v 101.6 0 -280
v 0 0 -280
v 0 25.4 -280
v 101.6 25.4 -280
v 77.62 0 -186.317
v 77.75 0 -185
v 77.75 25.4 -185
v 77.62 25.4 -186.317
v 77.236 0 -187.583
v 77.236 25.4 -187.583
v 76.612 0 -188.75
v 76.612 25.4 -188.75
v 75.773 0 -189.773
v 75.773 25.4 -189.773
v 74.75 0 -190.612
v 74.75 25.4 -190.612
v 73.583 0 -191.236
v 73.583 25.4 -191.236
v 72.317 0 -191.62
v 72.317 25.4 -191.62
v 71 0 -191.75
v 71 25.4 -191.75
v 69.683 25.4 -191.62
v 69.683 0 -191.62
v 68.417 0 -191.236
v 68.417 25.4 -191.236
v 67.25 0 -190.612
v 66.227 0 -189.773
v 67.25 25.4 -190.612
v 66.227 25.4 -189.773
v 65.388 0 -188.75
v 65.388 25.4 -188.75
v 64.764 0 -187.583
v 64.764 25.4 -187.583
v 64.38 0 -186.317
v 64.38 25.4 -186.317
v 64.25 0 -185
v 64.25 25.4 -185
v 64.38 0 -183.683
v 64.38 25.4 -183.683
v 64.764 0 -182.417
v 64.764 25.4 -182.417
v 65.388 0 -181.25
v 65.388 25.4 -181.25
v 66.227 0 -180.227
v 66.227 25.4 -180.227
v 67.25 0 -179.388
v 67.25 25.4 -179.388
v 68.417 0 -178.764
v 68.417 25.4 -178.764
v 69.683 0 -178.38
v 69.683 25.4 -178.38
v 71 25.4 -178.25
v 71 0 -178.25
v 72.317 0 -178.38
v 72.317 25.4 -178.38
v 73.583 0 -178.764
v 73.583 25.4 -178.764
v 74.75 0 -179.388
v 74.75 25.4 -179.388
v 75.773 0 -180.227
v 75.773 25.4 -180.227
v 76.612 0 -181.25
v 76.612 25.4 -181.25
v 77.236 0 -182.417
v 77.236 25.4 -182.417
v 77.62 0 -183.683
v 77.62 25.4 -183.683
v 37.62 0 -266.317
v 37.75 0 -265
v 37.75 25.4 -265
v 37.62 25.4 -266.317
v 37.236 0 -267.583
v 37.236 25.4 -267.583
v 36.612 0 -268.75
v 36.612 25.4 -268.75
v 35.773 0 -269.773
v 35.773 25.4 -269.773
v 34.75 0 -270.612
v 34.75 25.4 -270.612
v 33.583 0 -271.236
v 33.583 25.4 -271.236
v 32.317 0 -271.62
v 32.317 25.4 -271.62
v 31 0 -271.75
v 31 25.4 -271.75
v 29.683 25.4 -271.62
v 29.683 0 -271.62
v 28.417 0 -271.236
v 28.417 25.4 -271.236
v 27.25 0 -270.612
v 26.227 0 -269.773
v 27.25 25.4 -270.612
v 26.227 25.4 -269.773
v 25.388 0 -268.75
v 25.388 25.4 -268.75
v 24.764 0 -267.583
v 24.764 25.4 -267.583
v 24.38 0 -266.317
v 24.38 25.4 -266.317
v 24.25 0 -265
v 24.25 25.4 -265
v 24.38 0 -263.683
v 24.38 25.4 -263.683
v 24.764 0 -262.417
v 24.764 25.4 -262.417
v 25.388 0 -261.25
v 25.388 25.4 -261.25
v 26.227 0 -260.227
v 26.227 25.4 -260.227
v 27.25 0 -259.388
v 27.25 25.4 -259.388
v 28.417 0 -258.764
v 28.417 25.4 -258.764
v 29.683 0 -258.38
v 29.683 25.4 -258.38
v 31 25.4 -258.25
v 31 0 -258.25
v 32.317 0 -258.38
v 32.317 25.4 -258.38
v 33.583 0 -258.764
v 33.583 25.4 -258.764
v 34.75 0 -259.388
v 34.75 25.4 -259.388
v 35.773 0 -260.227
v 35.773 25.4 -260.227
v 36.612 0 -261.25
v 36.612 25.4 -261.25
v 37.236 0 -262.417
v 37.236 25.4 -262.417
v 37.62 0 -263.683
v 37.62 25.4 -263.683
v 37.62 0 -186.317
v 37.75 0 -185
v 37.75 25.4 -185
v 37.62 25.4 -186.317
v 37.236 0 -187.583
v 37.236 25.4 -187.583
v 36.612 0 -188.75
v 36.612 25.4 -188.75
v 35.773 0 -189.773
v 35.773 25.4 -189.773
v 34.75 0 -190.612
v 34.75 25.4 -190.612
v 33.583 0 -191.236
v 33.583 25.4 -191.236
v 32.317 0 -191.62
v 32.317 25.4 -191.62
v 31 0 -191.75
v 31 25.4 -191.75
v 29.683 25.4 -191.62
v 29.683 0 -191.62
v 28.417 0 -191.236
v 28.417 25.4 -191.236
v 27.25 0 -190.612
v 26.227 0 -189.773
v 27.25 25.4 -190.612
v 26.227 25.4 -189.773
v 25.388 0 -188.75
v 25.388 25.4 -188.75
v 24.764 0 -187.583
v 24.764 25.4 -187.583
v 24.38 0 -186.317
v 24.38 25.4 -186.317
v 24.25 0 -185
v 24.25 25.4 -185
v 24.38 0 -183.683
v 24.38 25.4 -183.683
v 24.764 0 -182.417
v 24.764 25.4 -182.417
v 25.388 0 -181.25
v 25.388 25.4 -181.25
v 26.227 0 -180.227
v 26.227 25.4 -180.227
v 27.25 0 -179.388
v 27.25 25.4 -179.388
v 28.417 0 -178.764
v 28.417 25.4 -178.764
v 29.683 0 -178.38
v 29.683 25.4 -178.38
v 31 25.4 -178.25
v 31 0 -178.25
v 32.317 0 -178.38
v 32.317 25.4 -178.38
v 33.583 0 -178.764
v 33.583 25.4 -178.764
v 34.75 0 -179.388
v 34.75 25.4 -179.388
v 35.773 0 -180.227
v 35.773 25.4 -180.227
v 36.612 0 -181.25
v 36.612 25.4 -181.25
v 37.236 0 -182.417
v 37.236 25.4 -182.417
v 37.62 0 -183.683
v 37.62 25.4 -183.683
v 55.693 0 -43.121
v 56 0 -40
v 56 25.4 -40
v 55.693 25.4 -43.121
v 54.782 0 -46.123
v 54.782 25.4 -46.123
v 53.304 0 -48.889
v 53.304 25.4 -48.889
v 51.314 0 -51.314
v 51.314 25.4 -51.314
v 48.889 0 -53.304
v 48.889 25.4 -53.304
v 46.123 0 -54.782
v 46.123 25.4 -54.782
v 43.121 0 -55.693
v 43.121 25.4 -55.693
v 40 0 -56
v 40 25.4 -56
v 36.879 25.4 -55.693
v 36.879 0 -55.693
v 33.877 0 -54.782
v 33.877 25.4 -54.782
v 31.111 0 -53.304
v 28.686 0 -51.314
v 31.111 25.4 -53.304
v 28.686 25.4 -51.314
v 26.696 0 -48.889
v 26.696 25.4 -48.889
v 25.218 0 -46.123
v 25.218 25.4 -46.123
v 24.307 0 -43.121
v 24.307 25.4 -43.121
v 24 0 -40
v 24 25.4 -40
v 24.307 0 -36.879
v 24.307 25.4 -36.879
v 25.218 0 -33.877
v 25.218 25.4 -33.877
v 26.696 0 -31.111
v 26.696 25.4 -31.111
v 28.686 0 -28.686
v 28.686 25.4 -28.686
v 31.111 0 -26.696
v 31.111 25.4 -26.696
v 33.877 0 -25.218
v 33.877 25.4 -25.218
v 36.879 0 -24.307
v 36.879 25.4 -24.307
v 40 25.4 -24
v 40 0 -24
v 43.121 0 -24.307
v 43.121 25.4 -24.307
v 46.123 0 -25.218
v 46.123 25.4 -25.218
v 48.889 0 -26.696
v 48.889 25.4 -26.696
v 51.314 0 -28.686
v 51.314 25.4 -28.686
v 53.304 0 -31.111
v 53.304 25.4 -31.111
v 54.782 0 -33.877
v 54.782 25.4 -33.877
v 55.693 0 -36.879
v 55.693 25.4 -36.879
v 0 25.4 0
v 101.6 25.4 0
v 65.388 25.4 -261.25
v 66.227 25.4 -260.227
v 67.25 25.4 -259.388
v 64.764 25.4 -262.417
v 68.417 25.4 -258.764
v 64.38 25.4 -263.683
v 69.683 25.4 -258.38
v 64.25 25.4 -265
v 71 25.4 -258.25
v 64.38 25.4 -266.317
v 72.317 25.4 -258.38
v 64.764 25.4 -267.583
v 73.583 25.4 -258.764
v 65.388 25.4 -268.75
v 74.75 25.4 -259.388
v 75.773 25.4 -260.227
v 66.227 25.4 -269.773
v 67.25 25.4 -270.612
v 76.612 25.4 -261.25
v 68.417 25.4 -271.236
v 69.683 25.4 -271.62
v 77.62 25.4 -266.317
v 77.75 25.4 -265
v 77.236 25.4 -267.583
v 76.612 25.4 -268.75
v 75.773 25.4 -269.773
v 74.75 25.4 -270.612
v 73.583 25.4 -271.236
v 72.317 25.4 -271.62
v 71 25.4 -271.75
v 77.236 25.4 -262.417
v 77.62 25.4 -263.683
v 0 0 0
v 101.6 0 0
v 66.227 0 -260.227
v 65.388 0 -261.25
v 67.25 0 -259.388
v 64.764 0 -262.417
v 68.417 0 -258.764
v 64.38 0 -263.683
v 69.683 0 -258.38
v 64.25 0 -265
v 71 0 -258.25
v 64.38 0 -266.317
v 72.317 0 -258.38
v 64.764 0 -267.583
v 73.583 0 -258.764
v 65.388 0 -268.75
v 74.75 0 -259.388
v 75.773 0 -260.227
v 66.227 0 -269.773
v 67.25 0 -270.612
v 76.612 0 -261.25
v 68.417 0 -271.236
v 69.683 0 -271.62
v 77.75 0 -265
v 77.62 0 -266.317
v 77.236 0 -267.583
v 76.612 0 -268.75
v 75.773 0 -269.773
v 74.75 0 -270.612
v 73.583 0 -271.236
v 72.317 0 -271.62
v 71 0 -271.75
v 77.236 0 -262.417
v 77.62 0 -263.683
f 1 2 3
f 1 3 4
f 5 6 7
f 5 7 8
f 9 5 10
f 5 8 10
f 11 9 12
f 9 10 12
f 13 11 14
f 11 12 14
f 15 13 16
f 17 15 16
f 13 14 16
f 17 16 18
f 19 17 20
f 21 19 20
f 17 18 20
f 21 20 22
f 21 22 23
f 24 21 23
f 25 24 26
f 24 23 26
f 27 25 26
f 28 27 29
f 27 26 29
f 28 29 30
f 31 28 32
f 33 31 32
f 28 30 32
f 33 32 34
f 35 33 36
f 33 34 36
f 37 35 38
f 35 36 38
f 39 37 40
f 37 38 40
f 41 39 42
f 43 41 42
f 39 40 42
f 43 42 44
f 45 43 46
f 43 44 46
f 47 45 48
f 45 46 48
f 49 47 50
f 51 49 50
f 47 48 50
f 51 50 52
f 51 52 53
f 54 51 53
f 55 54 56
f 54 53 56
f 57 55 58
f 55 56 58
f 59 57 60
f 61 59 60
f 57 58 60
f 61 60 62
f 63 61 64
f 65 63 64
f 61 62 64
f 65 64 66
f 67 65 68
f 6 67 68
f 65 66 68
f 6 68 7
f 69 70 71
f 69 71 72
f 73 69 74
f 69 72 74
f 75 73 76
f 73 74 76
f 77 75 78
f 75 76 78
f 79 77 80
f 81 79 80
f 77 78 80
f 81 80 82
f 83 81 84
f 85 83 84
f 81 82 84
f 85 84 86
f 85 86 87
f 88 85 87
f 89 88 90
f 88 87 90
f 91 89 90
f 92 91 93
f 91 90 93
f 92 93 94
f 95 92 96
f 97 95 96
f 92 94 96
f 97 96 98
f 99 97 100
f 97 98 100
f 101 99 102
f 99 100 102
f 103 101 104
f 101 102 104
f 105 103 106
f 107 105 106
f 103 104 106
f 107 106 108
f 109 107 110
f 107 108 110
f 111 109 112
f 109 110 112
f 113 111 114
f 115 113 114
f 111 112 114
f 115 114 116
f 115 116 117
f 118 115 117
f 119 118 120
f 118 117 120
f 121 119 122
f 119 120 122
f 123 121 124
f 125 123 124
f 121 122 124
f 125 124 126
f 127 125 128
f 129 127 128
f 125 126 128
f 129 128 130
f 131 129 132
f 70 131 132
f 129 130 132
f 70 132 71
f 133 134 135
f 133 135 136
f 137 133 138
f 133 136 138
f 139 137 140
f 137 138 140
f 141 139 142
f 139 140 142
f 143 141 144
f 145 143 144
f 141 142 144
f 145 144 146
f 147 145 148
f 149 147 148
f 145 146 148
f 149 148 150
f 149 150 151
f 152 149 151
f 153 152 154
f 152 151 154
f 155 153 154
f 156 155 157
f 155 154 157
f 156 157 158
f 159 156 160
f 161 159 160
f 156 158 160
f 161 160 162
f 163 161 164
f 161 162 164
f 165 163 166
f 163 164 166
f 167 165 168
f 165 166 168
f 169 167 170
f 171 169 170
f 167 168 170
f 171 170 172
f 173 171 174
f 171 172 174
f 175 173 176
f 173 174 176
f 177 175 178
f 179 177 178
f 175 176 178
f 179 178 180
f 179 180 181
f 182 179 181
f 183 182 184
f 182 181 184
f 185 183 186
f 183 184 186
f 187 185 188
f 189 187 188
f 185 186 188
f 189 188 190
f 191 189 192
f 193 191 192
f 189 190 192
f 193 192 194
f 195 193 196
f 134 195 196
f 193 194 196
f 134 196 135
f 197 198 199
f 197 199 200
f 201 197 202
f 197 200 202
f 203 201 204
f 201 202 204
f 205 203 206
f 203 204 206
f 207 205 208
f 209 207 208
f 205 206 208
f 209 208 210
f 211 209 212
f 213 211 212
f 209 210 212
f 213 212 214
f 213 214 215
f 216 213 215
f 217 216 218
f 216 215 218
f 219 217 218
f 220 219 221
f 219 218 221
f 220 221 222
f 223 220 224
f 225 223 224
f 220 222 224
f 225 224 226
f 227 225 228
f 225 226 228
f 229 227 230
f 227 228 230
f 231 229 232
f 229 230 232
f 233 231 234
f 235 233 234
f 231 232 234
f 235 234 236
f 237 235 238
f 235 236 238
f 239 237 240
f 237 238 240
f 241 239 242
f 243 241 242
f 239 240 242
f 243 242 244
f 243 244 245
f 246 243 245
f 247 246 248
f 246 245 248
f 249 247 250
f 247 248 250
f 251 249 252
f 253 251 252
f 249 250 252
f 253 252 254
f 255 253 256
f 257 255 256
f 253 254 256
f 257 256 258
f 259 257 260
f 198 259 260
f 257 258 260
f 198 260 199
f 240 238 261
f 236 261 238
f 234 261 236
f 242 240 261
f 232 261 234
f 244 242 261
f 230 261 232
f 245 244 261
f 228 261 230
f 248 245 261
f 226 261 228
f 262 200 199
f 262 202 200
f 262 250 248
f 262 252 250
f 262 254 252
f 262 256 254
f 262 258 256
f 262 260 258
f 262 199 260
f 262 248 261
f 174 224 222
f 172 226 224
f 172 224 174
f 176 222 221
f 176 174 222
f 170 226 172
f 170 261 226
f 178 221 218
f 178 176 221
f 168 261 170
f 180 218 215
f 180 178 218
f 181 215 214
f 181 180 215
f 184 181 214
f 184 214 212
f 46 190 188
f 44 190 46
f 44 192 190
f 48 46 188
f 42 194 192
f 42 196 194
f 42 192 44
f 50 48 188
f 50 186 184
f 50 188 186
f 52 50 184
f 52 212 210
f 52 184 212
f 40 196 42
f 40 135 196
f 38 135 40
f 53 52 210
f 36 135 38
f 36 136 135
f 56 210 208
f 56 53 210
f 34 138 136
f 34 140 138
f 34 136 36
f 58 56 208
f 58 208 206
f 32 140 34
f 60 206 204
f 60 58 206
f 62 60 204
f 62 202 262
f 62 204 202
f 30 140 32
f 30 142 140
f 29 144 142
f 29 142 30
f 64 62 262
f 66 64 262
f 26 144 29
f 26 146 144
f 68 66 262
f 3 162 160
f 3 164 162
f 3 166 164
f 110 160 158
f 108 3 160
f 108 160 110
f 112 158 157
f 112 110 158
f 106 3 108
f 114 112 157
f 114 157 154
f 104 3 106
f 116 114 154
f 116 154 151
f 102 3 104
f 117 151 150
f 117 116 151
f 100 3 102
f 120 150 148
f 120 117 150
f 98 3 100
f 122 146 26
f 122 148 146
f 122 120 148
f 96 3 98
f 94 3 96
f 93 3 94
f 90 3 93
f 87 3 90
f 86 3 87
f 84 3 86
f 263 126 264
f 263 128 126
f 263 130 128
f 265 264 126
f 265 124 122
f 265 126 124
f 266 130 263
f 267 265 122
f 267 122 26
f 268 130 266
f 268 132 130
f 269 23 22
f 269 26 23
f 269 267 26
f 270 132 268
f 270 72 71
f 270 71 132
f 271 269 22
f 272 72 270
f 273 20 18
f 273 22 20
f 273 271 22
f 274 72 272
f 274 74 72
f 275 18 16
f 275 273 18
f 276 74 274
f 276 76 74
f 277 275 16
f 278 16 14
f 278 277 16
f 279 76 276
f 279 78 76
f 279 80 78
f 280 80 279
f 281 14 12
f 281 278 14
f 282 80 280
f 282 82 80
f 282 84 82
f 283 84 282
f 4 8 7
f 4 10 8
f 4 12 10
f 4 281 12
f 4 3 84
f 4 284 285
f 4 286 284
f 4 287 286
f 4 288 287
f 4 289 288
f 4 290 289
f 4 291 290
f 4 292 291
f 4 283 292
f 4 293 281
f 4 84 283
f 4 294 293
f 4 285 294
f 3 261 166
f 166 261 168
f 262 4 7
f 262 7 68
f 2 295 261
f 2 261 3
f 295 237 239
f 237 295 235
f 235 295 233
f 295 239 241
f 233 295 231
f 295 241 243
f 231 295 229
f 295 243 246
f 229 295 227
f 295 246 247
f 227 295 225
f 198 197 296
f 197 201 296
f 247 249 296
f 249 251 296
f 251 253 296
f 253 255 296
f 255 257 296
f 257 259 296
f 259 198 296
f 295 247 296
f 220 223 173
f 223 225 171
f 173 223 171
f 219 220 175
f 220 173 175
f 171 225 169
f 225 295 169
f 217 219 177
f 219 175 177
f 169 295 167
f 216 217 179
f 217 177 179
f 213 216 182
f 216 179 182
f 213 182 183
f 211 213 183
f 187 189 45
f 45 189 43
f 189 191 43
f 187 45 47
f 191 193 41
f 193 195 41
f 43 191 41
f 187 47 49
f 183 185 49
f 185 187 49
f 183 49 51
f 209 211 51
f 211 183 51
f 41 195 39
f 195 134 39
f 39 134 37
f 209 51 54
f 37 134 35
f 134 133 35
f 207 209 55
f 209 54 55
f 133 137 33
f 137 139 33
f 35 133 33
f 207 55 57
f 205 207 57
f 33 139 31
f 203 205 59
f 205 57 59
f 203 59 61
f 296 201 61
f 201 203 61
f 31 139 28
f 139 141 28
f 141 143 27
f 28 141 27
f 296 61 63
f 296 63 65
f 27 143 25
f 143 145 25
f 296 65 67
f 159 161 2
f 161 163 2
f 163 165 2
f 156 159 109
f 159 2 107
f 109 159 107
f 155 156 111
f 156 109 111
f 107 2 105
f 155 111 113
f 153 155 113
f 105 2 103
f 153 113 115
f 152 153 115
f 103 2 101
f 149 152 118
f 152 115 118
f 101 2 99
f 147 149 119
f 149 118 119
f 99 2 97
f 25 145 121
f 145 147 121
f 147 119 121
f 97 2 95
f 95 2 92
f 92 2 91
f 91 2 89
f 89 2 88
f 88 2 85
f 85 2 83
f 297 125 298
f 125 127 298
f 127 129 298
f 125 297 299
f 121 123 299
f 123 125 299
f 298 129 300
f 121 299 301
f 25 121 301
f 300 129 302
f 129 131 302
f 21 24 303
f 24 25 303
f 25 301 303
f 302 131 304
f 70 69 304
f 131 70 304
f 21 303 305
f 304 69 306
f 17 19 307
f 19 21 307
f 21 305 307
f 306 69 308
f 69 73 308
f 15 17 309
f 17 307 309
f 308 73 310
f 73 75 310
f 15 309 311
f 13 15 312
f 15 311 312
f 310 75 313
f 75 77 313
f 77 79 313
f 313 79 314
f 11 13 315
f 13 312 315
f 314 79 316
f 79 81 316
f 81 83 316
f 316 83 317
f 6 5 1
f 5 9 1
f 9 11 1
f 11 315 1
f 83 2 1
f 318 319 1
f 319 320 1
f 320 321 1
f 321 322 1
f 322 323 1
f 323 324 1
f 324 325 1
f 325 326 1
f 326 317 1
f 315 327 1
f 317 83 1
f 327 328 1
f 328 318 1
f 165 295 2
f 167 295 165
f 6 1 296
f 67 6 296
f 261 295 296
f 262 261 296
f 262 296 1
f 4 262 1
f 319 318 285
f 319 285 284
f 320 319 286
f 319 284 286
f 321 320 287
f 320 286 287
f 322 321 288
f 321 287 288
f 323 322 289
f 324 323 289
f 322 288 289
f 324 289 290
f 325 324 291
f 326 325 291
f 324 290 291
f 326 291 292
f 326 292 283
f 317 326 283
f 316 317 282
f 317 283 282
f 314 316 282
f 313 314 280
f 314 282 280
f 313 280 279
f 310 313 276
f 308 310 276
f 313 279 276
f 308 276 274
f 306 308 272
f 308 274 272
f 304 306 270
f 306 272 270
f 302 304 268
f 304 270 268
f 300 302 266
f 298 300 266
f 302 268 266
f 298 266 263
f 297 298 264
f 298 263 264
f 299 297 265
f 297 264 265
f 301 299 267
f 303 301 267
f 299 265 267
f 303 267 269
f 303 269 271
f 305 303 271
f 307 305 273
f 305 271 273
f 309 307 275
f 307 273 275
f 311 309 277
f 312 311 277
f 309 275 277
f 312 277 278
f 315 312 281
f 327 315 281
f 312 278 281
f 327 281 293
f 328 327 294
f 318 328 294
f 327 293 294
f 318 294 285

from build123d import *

# Parameters (mm, degrees)
SKETCH2_W           = 101.6
SKETCH2_H           = 280
BOSS_EXTRUDE1_DEPTH = 25.4
SKETCH3_R           = 6.75
CUT_EXTRUDE1_DEPTH  = 25.4
SKETCH4_R           = 16
CUT_EXTRUDE2_DEPTH  = 25.4


with BuildPart() as part:
    # Sketch2 → Boss-Extrude1 (new body)
    with BuildSketch(Plane(origin=(0, 0, 0), x_dir=(1, 0, 0), z_dir=(0, 1, 0))):
        with Locations((50.8, 140)):
            Rectangle(SKETCH2_W, SKETCH2_H)
    extrude(amount=BOSS_EXTRUDE1_DEPTH)

    # Sketch3 → Cut-Extrude1 (cut)
    with BuildSketch(Plane(origin=(0, 25.4, 0), x_dir=(1, 0, 0), z_dir=(0, 1, 0))):
        with Locations((71, 265)):
            Circle(SKETCH3_R)
        with Locations((31, 265)):
            Circle(SKETCH3_R)
        with Locations((31, 185)):
            Circle(SKETCH3_R)
        with Locations((71, 185)):
            Circle(SKETCH3_R)
    extrude(amount=-CUT_EXTRUDE1_DEPTH, mode=Mode.SUBTRACT)

    # Sketch4 → Cut-Extrude2 (cut)
    with BuildSketch(Plane(origin=(0, 25.4, 0), x_dir=(1, 0, 0), z_dir=(0, 1, 0))):
        with Locations((40, 40)):
            Circle(SKETCH4_R)
    extrude(amount=-CUT_EXTRUDE2_DEPTH, mode=Mode.SUBTRACT)


solid = part.part
